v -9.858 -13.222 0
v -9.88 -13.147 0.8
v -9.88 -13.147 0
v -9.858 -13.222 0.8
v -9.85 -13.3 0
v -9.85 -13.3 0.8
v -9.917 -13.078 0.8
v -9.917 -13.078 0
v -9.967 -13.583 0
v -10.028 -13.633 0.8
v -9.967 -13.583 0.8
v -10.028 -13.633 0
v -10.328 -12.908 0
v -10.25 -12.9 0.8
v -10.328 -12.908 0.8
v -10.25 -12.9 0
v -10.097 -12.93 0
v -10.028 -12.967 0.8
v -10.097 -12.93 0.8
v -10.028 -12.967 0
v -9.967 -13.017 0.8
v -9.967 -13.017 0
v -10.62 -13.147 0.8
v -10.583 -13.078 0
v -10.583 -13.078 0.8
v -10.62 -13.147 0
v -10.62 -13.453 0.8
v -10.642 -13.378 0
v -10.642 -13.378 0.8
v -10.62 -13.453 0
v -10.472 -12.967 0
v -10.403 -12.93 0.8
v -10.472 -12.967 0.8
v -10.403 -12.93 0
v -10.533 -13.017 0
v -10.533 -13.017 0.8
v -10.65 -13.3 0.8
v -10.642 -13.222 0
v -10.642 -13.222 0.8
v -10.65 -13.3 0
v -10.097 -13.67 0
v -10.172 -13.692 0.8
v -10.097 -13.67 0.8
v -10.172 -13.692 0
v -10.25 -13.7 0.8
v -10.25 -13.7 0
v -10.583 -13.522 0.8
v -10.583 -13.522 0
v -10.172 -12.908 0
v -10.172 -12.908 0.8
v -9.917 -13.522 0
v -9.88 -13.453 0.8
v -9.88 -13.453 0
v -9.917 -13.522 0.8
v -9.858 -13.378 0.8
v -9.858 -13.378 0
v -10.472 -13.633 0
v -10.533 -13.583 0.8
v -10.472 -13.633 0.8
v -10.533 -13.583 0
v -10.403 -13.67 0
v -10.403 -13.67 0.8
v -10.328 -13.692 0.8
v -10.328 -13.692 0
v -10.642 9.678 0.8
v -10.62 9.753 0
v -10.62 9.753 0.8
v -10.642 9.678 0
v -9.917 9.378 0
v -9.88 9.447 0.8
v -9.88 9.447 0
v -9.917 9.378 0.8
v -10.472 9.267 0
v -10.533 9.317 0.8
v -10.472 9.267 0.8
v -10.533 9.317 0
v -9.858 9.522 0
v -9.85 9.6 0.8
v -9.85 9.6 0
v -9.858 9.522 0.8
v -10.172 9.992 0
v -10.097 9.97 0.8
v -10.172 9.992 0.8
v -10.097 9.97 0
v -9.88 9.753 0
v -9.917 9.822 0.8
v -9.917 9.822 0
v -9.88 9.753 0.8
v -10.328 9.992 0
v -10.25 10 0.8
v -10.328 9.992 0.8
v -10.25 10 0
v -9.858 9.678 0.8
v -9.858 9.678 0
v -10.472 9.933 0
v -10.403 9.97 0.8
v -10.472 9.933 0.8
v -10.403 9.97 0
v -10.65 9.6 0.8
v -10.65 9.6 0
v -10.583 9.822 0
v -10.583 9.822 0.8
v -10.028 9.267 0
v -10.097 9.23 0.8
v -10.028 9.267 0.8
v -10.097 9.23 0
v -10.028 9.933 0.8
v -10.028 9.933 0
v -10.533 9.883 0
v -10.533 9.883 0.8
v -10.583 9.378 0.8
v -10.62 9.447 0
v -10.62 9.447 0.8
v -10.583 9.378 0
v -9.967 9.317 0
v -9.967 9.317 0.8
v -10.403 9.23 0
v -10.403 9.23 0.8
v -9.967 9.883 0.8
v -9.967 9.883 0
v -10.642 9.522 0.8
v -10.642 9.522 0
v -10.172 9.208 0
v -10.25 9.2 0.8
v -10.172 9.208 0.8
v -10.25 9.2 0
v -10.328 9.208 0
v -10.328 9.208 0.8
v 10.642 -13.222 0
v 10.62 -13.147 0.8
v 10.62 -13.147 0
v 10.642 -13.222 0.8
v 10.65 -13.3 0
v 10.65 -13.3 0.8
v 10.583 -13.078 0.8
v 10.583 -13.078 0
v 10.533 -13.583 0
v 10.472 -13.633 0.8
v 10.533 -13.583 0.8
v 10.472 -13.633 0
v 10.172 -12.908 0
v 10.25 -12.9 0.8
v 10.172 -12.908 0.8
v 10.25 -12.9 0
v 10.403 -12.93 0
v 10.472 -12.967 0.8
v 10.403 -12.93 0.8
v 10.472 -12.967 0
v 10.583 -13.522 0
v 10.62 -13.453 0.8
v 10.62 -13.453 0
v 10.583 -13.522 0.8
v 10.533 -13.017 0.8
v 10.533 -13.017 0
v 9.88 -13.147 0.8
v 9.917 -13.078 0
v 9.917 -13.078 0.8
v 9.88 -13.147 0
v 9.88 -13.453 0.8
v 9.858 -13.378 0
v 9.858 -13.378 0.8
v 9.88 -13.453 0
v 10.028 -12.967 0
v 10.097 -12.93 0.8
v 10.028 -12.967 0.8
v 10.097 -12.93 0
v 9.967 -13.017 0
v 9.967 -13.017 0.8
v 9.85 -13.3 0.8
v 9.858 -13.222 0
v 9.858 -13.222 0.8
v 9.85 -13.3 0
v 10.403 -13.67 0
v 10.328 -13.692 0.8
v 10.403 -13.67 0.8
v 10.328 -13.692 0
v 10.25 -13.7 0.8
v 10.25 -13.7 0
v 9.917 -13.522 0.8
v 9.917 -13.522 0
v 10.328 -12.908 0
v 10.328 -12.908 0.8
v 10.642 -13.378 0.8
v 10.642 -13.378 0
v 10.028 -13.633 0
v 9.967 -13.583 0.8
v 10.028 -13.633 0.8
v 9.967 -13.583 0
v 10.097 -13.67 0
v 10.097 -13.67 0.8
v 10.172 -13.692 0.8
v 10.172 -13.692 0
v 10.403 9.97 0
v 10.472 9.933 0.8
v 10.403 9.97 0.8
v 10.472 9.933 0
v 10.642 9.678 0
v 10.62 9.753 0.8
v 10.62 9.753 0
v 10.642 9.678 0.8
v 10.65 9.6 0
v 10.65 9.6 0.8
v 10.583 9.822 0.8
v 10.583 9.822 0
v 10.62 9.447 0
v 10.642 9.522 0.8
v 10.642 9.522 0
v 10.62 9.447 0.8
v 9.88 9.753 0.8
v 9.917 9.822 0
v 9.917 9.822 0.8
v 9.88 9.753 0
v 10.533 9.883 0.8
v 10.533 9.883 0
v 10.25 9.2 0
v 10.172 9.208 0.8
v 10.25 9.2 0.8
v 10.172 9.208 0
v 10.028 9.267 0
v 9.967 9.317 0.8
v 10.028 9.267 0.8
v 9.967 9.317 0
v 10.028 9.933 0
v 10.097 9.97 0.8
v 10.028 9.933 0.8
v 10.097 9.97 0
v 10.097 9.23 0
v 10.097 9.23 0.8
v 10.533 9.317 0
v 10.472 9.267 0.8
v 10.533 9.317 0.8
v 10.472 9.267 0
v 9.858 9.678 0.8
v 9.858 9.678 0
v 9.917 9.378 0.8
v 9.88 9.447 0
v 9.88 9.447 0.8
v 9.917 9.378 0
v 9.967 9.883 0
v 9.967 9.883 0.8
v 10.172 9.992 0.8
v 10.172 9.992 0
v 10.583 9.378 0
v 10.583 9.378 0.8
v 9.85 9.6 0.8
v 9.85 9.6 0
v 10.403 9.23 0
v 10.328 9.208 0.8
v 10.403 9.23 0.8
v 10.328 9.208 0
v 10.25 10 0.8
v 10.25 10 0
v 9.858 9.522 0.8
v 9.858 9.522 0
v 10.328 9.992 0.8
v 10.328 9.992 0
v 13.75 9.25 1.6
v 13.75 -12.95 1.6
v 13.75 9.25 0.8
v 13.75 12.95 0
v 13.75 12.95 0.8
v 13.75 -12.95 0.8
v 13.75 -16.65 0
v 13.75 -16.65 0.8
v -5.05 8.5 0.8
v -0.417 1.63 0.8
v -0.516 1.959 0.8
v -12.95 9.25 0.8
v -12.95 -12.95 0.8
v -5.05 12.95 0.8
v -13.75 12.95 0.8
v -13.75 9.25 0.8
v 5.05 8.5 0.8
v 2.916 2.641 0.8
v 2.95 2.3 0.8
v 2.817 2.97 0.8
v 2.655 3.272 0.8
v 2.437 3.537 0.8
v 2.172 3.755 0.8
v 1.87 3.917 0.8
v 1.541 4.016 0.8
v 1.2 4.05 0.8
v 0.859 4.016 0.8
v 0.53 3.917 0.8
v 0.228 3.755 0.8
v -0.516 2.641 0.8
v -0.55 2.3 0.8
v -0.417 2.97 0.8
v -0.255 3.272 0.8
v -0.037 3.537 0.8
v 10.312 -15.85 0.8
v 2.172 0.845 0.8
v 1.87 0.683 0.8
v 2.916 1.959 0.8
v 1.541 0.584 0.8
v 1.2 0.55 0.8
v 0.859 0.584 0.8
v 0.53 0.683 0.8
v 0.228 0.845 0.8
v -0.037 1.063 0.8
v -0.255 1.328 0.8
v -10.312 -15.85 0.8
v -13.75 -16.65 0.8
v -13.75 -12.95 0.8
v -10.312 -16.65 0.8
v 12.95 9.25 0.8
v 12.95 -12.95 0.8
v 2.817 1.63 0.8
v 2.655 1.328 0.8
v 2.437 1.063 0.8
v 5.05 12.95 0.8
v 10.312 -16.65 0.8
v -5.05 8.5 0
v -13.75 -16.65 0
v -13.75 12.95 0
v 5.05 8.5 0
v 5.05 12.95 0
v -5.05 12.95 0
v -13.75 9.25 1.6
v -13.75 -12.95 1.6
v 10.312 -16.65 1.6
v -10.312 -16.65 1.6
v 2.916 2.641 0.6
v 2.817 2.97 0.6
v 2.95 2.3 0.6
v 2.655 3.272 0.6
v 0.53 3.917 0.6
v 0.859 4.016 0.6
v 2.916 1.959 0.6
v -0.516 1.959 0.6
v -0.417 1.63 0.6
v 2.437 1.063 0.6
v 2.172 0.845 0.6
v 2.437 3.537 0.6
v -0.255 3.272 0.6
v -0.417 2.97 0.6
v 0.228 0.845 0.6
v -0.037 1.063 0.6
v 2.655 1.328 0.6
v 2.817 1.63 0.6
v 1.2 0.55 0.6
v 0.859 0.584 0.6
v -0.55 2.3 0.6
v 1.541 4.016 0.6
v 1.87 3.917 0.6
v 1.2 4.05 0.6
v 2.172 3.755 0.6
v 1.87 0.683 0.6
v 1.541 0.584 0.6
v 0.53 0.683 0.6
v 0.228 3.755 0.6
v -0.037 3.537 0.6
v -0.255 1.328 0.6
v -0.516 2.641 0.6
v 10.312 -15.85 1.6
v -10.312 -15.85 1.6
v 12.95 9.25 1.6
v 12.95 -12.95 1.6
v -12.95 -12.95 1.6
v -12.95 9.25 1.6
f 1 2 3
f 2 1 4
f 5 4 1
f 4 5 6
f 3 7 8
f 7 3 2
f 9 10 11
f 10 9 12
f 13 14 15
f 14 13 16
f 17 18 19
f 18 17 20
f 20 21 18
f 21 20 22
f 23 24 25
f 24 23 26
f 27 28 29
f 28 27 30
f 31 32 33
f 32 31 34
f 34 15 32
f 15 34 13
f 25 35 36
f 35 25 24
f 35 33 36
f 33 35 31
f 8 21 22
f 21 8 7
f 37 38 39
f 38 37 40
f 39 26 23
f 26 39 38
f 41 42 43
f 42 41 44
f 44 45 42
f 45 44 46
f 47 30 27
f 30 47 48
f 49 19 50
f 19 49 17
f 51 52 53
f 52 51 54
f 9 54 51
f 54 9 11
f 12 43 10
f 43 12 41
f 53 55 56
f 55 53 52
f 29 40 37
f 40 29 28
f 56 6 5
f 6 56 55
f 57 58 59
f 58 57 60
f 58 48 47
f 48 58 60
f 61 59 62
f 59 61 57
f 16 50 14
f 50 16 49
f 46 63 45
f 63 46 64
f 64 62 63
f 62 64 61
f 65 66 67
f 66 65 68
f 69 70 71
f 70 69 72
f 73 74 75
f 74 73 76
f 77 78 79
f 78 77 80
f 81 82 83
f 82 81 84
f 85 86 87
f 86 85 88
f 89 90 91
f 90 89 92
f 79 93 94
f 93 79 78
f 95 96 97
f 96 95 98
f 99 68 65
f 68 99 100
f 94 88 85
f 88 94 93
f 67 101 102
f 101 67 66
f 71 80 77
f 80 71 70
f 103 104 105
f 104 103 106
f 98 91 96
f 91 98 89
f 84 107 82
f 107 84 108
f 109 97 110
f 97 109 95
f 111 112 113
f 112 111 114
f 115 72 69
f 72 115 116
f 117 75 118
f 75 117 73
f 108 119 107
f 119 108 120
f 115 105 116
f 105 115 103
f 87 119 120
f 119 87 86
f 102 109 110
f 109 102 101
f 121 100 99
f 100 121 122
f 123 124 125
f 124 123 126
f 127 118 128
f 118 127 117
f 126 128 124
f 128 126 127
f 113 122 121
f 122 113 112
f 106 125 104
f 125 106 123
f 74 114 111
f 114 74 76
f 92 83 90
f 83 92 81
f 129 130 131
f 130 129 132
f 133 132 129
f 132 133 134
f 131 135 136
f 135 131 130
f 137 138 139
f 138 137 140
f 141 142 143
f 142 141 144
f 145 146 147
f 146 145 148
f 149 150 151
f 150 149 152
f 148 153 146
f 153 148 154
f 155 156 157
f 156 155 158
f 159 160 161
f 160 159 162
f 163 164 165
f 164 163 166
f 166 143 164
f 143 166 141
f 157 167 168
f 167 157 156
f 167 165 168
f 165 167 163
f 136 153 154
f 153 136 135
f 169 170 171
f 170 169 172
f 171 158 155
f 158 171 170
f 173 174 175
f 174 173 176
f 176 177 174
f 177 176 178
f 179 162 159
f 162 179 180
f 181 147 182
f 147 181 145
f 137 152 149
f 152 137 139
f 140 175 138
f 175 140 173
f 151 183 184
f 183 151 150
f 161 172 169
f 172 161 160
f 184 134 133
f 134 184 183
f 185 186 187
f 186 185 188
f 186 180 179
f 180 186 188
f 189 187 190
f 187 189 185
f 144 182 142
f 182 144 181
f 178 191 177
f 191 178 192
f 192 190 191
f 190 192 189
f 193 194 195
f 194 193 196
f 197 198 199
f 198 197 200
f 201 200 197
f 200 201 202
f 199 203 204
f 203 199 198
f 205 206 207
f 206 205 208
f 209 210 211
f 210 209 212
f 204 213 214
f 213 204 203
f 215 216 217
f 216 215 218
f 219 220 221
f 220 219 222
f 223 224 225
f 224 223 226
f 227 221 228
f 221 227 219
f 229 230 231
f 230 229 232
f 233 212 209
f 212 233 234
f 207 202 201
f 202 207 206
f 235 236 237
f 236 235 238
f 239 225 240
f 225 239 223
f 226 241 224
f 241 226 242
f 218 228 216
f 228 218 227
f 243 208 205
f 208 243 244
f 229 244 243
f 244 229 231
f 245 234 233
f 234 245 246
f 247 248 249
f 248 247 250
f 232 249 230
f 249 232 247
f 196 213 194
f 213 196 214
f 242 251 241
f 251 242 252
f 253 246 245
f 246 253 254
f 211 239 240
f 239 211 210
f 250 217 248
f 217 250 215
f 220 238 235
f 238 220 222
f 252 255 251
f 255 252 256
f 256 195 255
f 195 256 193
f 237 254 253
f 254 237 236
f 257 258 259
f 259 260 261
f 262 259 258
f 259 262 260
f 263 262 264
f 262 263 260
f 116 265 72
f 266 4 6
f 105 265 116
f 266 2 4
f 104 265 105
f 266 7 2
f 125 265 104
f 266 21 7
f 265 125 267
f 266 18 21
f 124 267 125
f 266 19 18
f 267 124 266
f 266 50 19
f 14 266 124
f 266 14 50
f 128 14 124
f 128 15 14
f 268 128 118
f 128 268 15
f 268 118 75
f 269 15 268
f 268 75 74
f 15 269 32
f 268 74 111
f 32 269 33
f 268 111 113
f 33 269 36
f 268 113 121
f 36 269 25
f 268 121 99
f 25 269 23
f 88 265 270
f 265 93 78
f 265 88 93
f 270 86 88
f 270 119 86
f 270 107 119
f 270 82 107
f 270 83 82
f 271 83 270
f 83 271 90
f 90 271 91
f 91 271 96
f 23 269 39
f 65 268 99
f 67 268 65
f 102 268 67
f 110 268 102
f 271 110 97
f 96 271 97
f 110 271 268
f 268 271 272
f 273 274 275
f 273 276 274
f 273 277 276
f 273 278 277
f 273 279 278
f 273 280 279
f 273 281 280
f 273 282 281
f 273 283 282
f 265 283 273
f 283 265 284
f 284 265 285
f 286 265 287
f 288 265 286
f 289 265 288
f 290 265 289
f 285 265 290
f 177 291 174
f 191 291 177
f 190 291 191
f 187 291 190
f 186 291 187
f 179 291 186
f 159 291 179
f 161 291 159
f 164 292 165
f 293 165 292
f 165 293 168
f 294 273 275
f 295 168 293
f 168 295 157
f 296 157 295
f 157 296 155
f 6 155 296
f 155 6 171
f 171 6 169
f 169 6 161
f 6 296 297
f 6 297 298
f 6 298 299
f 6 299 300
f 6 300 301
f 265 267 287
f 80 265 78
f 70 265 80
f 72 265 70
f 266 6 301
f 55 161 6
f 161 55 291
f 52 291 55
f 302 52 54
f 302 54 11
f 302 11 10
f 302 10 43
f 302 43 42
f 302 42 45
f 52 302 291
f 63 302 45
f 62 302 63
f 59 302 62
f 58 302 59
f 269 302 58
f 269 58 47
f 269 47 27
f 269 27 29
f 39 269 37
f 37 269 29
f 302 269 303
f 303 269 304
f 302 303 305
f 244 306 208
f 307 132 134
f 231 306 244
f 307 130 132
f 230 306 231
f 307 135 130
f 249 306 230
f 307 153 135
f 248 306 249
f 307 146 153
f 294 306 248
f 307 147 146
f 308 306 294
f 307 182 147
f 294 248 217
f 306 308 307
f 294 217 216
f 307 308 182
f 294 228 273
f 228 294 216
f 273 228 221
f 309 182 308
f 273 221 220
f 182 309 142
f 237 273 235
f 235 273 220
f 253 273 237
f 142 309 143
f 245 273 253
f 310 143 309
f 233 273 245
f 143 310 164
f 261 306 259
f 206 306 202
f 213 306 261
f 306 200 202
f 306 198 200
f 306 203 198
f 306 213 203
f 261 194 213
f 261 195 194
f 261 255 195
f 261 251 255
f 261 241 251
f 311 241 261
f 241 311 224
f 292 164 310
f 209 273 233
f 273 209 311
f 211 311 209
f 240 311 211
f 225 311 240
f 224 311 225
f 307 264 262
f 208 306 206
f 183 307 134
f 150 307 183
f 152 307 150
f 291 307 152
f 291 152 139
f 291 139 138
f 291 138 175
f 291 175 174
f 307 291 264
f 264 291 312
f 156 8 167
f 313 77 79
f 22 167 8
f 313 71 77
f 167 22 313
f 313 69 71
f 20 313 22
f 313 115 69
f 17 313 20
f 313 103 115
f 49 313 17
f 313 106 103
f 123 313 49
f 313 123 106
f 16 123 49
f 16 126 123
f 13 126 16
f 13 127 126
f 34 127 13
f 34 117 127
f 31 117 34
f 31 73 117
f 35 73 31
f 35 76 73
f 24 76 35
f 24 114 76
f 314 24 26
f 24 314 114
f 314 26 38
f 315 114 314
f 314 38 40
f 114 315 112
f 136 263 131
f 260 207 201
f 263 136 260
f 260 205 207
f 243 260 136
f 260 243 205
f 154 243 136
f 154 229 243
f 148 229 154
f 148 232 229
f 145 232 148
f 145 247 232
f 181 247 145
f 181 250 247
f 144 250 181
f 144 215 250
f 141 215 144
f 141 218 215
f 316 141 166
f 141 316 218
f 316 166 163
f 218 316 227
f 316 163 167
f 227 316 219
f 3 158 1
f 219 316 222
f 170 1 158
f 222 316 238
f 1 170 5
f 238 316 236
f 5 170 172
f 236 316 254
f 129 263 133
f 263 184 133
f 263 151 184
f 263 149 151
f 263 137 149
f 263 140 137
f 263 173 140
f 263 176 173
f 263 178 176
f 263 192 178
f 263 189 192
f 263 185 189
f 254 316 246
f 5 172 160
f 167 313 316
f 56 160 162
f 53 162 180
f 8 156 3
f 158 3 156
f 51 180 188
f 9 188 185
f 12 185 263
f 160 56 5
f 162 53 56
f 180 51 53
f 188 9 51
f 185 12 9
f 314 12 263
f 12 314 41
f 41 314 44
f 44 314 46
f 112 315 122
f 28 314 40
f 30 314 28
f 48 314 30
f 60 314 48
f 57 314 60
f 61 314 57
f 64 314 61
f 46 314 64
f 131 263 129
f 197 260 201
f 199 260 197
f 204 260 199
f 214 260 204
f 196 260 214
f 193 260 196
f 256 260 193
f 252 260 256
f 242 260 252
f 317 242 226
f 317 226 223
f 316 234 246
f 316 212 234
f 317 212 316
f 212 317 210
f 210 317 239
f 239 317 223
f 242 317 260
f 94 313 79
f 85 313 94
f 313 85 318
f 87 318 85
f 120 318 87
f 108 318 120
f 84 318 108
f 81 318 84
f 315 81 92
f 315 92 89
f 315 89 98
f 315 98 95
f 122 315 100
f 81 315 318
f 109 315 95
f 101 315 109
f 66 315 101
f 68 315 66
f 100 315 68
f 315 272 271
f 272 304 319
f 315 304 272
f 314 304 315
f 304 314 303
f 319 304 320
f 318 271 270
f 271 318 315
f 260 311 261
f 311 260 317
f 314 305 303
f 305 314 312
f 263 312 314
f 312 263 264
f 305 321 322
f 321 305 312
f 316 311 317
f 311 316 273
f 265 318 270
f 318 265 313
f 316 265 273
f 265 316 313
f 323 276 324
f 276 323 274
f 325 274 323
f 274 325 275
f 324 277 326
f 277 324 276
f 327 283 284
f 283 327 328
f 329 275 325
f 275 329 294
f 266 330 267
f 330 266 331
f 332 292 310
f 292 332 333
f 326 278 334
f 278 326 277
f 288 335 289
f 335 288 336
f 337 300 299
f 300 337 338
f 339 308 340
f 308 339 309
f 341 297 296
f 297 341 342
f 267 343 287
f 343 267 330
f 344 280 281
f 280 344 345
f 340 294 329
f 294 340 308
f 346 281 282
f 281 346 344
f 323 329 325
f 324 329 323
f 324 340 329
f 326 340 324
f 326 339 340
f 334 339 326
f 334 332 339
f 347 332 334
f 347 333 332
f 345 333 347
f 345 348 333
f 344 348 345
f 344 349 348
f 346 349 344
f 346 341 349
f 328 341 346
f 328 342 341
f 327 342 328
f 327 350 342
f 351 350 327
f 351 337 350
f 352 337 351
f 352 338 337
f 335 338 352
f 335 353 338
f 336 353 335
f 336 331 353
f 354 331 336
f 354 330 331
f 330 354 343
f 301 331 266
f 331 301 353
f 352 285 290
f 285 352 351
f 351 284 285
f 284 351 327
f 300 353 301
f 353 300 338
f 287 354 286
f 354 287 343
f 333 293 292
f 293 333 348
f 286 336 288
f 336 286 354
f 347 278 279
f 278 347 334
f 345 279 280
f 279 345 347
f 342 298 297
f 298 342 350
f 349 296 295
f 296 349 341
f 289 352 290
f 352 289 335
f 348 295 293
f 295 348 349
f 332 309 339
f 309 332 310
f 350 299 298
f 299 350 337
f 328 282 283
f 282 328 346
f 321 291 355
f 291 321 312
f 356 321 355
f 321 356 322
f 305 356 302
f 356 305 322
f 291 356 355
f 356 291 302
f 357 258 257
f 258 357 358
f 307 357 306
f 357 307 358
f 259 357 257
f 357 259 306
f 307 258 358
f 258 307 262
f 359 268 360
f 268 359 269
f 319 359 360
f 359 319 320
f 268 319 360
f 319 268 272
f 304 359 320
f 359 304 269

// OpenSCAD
// file: oled_case_params.scad
display_x = 24.8;
display_y = 26.9;
window_x = 23.4;
window_y = 12.2;
pin_to_window_top = 3.5;
pin_to_window_bottom = 7.2;
pin_dist_x = 20.5;
nozzle_dia = 0.4;
side_wall_th = nozzle_dia * 2;
front_th = 0.8;
back_th = 0.8;
print_margin = 0.15;
eps = 0.01;
extra_space = 0.4;
case_height = front_th + 4.0 + back_th;
inner_x = display_x + (print_margin * 2) + (extra_space * 2);
inner_y = display_y + (print_margin * 2) + (extra_space * 2);
top_pin_y = (window_y / 2) + pin_to_window_top;
bottom_pin_y = -(window_y / 2) - pin_to_window_bottom;
pocket_center_y = (top_pin_y + bottom_pin_y) / 2;
outer_x = inner_x + (side_wall_th * 2);
outer_y = inner_y + (side_wall_th * 2);
pin_dia = 2.4;
pin_height = 3.5;
flare_height = 0.5;
flare_dia = pin_dia + 1.4;
pin_hole_dia = 0.8;
pin_hole_depth = pin_height - flare_height - 0.3;

lid_clearance = 0.18;
lid_x = outer_x;
lid_y = outer_y;
cutout_depth = 4.1 + (print_margin * 2);
cutout_width = 9.8 + (print_margin * 2);
recess_dia = 3.5;
recess_depth = 0.2;
recess_pos_x = 1.2;
recess_pos_y = 2.3;
tab_depth = 0.8;
edge_length_factor = 0.75;

filler_extension = 0.3;
filler_height = 1.5;
filler_y_pos = pocket_center_y + (inner_y / 2);
filler_width = cutout_width - lid_clearance;

tab_width_tol = tab_depth + (print_margin * 2);
// main file
include <oled_case_params.scad>

module lid_base() {
    translate([0, pocket_center_y, back_th / 2])
        cube([lid_x, lid_y, back_th], center = true);
}

module pin_cutout() {
    translate([0, pocket_center_y + (lid_y / 2) - (cutout_depth / 2), back_th / 2])
        cube([cutout_width, cutout_depth + 0.1, back_th + 0.2], center = true);
}

module component_recess(x, y) {
    translate([x, y, back_th - recess_depth])
        cylinder(h = recess_depth + 0.1, d = recess_dia, $fn = 32);
}

module lid_pin_holes() {
    for (px = [-pin_dist_x/2, pin_dist_x/2], py = [bottom_pin_y, top_pin_y]) {
        translate([px, py, -0.1])
            cylinder(h = back_th + 0.2, d = pin_hole_dia, $fn = 32);
    }
}

module base_plate() {
    difference() {
        lid_base();
        pin_cutout();
        component_recess(recess_pos_x, recess_pos_y);
        lid_pin_holes();
    }
}

module edge_bars() {
    translate([0, pocket_center_y - (lid_y / 2) + (tab_depth / 2), back_th + tab_depth / 2])
        cube([lid_x * edge_length_factor, tab_depth, tab_depth], center = true);
    translate([(lid_x / 2) - (tab_depth / 2), pocket_center_y, back_th + tab_depth / 2])
        cube([tab_depth, lid_y * edge_length_factor, tab_depth], center = true);
    translate([(-lid_x / 2) + (tab_depth / 2), pocket_center_y, back_th + tab_depth / 2])
        cube([tab_depth, lid_y * edge_length_factor, tab_depth], center = true);
}

module lid_assembly() {
    union() {
        base_plate();
        edge_bars();
    }
}

lid_assembly();
